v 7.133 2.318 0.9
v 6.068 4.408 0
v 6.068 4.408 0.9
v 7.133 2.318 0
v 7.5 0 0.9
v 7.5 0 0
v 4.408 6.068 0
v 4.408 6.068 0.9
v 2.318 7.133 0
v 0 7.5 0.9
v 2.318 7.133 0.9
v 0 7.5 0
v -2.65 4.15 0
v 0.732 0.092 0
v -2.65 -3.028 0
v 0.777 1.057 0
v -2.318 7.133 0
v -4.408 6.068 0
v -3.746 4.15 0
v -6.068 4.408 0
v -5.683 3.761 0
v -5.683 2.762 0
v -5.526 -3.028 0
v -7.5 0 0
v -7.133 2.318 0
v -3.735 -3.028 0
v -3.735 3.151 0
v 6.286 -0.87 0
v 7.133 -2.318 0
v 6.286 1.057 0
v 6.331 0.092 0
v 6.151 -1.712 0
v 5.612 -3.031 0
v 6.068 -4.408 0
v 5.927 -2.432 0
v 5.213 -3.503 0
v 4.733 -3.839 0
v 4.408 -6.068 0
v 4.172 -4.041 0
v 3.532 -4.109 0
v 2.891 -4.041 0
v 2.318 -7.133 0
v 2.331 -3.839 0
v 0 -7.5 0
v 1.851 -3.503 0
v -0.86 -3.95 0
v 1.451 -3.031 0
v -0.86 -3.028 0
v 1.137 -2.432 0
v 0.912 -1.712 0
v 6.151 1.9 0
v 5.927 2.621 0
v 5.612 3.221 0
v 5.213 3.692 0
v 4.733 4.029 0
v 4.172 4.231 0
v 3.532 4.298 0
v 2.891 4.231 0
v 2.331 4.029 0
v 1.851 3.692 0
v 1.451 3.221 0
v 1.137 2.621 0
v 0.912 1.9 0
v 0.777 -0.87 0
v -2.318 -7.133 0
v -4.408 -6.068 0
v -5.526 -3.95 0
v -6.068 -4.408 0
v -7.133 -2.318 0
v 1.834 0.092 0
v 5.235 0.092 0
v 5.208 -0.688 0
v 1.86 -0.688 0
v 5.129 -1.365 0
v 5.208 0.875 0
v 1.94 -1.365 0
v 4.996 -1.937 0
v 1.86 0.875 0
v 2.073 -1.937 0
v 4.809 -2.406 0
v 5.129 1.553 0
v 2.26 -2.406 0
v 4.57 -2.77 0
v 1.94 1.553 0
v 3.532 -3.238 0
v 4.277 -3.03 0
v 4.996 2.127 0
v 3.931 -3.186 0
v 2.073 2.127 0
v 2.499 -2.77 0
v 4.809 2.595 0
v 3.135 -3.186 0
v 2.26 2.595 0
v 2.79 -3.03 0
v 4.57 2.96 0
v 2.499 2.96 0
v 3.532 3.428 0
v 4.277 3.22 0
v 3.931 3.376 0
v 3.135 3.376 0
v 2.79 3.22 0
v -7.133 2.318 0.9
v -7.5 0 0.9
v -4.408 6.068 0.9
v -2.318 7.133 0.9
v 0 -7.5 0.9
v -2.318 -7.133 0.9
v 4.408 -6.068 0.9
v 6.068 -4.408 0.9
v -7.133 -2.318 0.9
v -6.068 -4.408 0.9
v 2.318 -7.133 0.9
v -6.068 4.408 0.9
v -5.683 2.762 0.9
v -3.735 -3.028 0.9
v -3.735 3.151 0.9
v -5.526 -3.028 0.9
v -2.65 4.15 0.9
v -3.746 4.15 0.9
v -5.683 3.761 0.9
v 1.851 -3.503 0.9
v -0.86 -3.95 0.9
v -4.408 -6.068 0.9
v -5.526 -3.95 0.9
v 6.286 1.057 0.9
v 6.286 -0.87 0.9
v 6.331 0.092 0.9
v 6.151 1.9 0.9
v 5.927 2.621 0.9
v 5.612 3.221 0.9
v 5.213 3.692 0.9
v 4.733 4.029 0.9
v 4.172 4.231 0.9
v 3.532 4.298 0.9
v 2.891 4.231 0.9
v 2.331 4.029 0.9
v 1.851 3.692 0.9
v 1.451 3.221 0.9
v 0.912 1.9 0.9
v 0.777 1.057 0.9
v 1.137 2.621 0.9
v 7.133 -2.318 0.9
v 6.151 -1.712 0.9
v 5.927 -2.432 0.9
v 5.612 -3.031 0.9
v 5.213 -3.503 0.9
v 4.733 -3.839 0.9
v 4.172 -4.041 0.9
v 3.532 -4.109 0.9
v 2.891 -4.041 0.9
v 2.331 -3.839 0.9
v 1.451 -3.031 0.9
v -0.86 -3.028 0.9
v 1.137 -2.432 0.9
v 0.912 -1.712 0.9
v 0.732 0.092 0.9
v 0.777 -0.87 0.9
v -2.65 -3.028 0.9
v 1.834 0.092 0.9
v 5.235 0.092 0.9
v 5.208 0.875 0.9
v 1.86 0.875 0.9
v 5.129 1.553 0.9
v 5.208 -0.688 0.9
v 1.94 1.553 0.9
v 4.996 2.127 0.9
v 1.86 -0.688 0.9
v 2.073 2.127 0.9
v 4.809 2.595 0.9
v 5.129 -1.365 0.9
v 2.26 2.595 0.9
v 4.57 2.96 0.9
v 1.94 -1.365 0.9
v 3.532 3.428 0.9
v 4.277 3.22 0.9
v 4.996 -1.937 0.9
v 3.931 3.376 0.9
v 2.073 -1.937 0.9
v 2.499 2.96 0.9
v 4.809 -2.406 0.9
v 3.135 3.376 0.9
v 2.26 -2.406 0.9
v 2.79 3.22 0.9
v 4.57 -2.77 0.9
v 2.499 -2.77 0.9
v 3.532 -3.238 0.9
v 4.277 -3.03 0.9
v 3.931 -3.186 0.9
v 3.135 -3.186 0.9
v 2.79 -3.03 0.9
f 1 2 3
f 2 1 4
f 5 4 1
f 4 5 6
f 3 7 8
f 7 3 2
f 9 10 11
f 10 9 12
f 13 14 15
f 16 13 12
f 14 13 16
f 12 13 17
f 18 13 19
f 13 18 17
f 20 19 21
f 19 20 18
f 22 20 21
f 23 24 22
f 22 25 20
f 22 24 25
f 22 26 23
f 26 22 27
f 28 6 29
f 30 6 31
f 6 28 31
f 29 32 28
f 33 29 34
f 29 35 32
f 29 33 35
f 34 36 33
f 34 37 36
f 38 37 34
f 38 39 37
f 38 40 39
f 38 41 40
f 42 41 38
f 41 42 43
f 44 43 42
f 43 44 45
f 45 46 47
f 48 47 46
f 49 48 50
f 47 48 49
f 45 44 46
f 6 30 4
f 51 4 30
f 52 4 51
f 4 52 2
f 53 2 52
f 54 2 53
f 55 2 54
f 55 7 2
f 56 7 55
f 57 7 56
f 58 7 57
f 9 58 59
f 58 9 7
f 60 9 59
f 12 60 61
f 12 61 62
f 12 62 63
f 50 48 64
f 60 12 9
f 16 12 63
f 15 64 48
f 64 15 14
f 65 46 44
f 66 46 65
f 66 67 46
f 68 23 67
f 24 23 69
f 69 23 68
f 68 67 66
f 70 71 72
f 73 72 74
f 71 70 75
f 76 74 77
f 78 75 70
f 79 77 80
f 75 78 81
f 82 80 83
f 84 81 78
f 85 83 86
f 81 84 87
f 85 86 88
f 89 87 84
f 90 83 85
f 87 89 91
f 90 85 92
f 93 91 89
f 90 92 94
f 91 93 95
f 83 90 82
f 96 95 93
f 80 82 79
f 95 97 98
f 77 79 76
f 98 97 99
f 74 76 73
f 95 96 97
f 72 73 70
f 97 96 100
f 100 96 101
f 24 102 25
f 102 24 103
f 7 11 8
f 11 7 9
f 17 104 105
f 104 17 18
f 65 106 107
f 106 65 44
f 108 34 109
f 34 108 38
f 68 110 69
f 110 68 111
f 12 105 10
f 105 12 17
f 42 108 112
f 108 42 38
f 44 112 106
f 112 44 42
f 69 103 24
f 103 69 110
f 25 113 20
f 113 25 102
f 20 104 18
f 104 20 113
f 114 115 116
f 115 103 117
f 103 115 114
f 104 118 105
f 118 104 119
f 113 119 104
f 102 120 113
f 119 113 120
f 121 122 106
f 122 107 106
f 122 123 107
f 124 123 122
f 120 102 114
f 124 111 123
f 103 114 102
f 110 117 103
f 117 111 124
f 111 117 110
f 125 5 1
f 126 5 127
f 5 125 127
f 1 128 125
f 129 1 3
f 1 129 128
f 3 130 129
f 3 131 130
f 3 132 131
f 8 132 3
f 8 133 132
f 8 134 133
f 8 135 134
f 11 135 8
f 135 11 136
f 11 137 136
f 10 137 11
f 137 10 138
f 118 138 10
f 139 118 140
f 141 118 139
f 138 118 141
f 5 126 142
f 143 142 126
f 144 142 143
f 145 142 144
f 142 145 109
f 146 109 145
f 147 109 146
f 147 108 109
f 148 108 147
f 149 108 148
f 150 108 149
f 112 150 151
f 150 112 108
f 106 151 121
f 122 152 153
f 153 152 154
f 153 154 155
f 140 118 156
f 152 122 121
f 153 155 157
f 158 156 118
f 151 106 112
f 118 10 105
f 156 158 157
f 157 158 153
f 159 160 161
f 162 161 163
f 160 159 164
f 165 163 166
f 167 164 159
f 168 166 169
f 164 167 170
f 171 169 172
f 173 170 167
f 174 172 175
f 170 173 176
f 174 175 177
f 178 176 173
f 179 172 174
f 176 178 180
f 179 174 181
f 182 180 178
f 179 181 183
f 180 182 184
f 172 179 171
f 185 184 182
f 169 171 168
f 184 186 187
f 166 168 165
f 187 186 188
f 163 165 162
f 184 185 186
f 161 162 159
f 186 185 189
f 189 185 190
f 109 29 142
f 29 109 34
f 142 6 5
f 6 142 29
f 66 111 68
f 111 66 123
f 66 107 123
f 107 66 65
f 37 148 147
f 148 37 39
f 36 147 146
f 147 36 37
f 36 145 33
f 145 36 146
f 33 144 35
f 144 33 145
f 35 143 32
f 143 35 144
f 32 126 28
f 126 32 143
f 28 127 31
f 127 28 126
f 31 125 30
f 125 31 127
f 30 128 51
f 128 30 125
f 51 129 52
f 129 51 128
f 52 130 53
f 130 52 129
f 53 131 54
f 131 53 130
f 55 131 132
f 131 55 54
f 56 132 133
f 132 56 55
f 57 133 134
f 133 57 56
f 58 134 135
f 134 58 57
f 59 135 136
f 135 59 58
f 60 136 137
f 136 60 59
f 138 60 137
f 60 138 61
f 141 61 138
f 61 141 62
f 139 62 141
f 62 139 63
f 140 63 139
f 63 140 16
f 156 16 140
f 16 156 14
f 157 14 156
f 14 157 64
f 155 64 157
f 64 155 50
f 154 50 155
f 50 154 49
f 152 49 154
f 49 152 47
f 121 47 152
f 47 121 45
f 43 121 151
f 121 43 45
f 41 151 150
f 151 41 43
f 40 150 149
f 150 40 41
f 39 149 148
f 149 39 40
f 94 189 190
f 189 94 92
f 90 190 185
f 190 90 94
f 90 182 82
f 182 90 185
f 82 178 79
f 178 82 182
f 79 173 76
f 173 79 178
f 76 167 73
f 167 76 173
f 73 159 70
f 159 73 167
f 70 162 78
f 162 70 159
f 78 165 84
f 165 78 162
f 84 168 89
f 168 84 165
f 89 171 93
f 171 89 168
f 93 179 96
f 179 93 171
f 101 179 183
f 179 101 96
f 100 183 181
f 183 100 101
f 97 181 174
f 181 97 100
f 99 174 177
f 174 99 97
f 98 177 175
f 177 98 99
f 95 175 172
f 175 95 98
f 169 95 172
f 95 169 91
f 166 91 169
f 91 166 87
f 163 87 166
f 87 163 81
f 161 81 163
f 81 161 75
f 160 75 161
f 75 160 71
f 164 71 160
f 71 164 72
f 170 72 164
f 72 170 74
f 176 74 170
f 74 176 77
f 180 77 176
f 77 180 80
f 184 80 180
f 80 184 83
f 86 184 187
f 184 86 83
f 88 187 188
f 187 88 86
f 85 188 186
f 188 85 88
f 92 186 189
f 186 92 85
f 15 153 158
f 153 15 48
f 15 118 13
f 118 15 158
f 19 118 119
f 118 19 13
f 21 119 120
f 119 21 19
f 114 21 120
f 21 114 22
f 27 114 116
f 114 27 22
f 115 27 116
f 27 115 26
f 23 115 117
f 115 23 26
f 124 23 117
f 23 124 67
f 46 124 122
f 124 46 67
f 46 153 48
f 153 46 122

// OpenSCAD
/****************************
 * Coin Customizer          *
 * 1.0                      *
 * Jan 2016                 *
 * Stafford Tyo             *
 * Standards Electronics    *
 ****************************
 */

/* [Text] */

//Use only one or two characters, this is not meant for words (too long for a coin)
text=10;

//Height of the text, adjust as necessary to fit it on the coin
text_height=8;

//Stencil Font to use
font="Allerta Stencil"; //[Allerta Stencil,Stardos Stencil,Sirin Stencil]

/* [Coin] */

//Total coin diameter, in mm
coin_diameter=15; //[5:40]

//Number of sides to the coin, the more there are the smoother the circle
coin_facets=20; //[6:100]

//Overall thickness of the coin, best used with a multiple of your extrude height)
coin_thickness=0.9; //[0.2:0.1:4]


// preview[view:south, tilt:top]

//Written by Stafford Tyo, Standards Electronics 2016

a=coin_diameter;
b=coin_facets;
c=text_height;
d=coin_thickness;
e=(str(text));
f=font;

difference() {

cylinder (h=d, d=a, $fn=b);

linear_extrude(height=d*4, center=true, convexity=10) {
text (text=e, font=f, halign="center", valign="center", size=c);

}
}

